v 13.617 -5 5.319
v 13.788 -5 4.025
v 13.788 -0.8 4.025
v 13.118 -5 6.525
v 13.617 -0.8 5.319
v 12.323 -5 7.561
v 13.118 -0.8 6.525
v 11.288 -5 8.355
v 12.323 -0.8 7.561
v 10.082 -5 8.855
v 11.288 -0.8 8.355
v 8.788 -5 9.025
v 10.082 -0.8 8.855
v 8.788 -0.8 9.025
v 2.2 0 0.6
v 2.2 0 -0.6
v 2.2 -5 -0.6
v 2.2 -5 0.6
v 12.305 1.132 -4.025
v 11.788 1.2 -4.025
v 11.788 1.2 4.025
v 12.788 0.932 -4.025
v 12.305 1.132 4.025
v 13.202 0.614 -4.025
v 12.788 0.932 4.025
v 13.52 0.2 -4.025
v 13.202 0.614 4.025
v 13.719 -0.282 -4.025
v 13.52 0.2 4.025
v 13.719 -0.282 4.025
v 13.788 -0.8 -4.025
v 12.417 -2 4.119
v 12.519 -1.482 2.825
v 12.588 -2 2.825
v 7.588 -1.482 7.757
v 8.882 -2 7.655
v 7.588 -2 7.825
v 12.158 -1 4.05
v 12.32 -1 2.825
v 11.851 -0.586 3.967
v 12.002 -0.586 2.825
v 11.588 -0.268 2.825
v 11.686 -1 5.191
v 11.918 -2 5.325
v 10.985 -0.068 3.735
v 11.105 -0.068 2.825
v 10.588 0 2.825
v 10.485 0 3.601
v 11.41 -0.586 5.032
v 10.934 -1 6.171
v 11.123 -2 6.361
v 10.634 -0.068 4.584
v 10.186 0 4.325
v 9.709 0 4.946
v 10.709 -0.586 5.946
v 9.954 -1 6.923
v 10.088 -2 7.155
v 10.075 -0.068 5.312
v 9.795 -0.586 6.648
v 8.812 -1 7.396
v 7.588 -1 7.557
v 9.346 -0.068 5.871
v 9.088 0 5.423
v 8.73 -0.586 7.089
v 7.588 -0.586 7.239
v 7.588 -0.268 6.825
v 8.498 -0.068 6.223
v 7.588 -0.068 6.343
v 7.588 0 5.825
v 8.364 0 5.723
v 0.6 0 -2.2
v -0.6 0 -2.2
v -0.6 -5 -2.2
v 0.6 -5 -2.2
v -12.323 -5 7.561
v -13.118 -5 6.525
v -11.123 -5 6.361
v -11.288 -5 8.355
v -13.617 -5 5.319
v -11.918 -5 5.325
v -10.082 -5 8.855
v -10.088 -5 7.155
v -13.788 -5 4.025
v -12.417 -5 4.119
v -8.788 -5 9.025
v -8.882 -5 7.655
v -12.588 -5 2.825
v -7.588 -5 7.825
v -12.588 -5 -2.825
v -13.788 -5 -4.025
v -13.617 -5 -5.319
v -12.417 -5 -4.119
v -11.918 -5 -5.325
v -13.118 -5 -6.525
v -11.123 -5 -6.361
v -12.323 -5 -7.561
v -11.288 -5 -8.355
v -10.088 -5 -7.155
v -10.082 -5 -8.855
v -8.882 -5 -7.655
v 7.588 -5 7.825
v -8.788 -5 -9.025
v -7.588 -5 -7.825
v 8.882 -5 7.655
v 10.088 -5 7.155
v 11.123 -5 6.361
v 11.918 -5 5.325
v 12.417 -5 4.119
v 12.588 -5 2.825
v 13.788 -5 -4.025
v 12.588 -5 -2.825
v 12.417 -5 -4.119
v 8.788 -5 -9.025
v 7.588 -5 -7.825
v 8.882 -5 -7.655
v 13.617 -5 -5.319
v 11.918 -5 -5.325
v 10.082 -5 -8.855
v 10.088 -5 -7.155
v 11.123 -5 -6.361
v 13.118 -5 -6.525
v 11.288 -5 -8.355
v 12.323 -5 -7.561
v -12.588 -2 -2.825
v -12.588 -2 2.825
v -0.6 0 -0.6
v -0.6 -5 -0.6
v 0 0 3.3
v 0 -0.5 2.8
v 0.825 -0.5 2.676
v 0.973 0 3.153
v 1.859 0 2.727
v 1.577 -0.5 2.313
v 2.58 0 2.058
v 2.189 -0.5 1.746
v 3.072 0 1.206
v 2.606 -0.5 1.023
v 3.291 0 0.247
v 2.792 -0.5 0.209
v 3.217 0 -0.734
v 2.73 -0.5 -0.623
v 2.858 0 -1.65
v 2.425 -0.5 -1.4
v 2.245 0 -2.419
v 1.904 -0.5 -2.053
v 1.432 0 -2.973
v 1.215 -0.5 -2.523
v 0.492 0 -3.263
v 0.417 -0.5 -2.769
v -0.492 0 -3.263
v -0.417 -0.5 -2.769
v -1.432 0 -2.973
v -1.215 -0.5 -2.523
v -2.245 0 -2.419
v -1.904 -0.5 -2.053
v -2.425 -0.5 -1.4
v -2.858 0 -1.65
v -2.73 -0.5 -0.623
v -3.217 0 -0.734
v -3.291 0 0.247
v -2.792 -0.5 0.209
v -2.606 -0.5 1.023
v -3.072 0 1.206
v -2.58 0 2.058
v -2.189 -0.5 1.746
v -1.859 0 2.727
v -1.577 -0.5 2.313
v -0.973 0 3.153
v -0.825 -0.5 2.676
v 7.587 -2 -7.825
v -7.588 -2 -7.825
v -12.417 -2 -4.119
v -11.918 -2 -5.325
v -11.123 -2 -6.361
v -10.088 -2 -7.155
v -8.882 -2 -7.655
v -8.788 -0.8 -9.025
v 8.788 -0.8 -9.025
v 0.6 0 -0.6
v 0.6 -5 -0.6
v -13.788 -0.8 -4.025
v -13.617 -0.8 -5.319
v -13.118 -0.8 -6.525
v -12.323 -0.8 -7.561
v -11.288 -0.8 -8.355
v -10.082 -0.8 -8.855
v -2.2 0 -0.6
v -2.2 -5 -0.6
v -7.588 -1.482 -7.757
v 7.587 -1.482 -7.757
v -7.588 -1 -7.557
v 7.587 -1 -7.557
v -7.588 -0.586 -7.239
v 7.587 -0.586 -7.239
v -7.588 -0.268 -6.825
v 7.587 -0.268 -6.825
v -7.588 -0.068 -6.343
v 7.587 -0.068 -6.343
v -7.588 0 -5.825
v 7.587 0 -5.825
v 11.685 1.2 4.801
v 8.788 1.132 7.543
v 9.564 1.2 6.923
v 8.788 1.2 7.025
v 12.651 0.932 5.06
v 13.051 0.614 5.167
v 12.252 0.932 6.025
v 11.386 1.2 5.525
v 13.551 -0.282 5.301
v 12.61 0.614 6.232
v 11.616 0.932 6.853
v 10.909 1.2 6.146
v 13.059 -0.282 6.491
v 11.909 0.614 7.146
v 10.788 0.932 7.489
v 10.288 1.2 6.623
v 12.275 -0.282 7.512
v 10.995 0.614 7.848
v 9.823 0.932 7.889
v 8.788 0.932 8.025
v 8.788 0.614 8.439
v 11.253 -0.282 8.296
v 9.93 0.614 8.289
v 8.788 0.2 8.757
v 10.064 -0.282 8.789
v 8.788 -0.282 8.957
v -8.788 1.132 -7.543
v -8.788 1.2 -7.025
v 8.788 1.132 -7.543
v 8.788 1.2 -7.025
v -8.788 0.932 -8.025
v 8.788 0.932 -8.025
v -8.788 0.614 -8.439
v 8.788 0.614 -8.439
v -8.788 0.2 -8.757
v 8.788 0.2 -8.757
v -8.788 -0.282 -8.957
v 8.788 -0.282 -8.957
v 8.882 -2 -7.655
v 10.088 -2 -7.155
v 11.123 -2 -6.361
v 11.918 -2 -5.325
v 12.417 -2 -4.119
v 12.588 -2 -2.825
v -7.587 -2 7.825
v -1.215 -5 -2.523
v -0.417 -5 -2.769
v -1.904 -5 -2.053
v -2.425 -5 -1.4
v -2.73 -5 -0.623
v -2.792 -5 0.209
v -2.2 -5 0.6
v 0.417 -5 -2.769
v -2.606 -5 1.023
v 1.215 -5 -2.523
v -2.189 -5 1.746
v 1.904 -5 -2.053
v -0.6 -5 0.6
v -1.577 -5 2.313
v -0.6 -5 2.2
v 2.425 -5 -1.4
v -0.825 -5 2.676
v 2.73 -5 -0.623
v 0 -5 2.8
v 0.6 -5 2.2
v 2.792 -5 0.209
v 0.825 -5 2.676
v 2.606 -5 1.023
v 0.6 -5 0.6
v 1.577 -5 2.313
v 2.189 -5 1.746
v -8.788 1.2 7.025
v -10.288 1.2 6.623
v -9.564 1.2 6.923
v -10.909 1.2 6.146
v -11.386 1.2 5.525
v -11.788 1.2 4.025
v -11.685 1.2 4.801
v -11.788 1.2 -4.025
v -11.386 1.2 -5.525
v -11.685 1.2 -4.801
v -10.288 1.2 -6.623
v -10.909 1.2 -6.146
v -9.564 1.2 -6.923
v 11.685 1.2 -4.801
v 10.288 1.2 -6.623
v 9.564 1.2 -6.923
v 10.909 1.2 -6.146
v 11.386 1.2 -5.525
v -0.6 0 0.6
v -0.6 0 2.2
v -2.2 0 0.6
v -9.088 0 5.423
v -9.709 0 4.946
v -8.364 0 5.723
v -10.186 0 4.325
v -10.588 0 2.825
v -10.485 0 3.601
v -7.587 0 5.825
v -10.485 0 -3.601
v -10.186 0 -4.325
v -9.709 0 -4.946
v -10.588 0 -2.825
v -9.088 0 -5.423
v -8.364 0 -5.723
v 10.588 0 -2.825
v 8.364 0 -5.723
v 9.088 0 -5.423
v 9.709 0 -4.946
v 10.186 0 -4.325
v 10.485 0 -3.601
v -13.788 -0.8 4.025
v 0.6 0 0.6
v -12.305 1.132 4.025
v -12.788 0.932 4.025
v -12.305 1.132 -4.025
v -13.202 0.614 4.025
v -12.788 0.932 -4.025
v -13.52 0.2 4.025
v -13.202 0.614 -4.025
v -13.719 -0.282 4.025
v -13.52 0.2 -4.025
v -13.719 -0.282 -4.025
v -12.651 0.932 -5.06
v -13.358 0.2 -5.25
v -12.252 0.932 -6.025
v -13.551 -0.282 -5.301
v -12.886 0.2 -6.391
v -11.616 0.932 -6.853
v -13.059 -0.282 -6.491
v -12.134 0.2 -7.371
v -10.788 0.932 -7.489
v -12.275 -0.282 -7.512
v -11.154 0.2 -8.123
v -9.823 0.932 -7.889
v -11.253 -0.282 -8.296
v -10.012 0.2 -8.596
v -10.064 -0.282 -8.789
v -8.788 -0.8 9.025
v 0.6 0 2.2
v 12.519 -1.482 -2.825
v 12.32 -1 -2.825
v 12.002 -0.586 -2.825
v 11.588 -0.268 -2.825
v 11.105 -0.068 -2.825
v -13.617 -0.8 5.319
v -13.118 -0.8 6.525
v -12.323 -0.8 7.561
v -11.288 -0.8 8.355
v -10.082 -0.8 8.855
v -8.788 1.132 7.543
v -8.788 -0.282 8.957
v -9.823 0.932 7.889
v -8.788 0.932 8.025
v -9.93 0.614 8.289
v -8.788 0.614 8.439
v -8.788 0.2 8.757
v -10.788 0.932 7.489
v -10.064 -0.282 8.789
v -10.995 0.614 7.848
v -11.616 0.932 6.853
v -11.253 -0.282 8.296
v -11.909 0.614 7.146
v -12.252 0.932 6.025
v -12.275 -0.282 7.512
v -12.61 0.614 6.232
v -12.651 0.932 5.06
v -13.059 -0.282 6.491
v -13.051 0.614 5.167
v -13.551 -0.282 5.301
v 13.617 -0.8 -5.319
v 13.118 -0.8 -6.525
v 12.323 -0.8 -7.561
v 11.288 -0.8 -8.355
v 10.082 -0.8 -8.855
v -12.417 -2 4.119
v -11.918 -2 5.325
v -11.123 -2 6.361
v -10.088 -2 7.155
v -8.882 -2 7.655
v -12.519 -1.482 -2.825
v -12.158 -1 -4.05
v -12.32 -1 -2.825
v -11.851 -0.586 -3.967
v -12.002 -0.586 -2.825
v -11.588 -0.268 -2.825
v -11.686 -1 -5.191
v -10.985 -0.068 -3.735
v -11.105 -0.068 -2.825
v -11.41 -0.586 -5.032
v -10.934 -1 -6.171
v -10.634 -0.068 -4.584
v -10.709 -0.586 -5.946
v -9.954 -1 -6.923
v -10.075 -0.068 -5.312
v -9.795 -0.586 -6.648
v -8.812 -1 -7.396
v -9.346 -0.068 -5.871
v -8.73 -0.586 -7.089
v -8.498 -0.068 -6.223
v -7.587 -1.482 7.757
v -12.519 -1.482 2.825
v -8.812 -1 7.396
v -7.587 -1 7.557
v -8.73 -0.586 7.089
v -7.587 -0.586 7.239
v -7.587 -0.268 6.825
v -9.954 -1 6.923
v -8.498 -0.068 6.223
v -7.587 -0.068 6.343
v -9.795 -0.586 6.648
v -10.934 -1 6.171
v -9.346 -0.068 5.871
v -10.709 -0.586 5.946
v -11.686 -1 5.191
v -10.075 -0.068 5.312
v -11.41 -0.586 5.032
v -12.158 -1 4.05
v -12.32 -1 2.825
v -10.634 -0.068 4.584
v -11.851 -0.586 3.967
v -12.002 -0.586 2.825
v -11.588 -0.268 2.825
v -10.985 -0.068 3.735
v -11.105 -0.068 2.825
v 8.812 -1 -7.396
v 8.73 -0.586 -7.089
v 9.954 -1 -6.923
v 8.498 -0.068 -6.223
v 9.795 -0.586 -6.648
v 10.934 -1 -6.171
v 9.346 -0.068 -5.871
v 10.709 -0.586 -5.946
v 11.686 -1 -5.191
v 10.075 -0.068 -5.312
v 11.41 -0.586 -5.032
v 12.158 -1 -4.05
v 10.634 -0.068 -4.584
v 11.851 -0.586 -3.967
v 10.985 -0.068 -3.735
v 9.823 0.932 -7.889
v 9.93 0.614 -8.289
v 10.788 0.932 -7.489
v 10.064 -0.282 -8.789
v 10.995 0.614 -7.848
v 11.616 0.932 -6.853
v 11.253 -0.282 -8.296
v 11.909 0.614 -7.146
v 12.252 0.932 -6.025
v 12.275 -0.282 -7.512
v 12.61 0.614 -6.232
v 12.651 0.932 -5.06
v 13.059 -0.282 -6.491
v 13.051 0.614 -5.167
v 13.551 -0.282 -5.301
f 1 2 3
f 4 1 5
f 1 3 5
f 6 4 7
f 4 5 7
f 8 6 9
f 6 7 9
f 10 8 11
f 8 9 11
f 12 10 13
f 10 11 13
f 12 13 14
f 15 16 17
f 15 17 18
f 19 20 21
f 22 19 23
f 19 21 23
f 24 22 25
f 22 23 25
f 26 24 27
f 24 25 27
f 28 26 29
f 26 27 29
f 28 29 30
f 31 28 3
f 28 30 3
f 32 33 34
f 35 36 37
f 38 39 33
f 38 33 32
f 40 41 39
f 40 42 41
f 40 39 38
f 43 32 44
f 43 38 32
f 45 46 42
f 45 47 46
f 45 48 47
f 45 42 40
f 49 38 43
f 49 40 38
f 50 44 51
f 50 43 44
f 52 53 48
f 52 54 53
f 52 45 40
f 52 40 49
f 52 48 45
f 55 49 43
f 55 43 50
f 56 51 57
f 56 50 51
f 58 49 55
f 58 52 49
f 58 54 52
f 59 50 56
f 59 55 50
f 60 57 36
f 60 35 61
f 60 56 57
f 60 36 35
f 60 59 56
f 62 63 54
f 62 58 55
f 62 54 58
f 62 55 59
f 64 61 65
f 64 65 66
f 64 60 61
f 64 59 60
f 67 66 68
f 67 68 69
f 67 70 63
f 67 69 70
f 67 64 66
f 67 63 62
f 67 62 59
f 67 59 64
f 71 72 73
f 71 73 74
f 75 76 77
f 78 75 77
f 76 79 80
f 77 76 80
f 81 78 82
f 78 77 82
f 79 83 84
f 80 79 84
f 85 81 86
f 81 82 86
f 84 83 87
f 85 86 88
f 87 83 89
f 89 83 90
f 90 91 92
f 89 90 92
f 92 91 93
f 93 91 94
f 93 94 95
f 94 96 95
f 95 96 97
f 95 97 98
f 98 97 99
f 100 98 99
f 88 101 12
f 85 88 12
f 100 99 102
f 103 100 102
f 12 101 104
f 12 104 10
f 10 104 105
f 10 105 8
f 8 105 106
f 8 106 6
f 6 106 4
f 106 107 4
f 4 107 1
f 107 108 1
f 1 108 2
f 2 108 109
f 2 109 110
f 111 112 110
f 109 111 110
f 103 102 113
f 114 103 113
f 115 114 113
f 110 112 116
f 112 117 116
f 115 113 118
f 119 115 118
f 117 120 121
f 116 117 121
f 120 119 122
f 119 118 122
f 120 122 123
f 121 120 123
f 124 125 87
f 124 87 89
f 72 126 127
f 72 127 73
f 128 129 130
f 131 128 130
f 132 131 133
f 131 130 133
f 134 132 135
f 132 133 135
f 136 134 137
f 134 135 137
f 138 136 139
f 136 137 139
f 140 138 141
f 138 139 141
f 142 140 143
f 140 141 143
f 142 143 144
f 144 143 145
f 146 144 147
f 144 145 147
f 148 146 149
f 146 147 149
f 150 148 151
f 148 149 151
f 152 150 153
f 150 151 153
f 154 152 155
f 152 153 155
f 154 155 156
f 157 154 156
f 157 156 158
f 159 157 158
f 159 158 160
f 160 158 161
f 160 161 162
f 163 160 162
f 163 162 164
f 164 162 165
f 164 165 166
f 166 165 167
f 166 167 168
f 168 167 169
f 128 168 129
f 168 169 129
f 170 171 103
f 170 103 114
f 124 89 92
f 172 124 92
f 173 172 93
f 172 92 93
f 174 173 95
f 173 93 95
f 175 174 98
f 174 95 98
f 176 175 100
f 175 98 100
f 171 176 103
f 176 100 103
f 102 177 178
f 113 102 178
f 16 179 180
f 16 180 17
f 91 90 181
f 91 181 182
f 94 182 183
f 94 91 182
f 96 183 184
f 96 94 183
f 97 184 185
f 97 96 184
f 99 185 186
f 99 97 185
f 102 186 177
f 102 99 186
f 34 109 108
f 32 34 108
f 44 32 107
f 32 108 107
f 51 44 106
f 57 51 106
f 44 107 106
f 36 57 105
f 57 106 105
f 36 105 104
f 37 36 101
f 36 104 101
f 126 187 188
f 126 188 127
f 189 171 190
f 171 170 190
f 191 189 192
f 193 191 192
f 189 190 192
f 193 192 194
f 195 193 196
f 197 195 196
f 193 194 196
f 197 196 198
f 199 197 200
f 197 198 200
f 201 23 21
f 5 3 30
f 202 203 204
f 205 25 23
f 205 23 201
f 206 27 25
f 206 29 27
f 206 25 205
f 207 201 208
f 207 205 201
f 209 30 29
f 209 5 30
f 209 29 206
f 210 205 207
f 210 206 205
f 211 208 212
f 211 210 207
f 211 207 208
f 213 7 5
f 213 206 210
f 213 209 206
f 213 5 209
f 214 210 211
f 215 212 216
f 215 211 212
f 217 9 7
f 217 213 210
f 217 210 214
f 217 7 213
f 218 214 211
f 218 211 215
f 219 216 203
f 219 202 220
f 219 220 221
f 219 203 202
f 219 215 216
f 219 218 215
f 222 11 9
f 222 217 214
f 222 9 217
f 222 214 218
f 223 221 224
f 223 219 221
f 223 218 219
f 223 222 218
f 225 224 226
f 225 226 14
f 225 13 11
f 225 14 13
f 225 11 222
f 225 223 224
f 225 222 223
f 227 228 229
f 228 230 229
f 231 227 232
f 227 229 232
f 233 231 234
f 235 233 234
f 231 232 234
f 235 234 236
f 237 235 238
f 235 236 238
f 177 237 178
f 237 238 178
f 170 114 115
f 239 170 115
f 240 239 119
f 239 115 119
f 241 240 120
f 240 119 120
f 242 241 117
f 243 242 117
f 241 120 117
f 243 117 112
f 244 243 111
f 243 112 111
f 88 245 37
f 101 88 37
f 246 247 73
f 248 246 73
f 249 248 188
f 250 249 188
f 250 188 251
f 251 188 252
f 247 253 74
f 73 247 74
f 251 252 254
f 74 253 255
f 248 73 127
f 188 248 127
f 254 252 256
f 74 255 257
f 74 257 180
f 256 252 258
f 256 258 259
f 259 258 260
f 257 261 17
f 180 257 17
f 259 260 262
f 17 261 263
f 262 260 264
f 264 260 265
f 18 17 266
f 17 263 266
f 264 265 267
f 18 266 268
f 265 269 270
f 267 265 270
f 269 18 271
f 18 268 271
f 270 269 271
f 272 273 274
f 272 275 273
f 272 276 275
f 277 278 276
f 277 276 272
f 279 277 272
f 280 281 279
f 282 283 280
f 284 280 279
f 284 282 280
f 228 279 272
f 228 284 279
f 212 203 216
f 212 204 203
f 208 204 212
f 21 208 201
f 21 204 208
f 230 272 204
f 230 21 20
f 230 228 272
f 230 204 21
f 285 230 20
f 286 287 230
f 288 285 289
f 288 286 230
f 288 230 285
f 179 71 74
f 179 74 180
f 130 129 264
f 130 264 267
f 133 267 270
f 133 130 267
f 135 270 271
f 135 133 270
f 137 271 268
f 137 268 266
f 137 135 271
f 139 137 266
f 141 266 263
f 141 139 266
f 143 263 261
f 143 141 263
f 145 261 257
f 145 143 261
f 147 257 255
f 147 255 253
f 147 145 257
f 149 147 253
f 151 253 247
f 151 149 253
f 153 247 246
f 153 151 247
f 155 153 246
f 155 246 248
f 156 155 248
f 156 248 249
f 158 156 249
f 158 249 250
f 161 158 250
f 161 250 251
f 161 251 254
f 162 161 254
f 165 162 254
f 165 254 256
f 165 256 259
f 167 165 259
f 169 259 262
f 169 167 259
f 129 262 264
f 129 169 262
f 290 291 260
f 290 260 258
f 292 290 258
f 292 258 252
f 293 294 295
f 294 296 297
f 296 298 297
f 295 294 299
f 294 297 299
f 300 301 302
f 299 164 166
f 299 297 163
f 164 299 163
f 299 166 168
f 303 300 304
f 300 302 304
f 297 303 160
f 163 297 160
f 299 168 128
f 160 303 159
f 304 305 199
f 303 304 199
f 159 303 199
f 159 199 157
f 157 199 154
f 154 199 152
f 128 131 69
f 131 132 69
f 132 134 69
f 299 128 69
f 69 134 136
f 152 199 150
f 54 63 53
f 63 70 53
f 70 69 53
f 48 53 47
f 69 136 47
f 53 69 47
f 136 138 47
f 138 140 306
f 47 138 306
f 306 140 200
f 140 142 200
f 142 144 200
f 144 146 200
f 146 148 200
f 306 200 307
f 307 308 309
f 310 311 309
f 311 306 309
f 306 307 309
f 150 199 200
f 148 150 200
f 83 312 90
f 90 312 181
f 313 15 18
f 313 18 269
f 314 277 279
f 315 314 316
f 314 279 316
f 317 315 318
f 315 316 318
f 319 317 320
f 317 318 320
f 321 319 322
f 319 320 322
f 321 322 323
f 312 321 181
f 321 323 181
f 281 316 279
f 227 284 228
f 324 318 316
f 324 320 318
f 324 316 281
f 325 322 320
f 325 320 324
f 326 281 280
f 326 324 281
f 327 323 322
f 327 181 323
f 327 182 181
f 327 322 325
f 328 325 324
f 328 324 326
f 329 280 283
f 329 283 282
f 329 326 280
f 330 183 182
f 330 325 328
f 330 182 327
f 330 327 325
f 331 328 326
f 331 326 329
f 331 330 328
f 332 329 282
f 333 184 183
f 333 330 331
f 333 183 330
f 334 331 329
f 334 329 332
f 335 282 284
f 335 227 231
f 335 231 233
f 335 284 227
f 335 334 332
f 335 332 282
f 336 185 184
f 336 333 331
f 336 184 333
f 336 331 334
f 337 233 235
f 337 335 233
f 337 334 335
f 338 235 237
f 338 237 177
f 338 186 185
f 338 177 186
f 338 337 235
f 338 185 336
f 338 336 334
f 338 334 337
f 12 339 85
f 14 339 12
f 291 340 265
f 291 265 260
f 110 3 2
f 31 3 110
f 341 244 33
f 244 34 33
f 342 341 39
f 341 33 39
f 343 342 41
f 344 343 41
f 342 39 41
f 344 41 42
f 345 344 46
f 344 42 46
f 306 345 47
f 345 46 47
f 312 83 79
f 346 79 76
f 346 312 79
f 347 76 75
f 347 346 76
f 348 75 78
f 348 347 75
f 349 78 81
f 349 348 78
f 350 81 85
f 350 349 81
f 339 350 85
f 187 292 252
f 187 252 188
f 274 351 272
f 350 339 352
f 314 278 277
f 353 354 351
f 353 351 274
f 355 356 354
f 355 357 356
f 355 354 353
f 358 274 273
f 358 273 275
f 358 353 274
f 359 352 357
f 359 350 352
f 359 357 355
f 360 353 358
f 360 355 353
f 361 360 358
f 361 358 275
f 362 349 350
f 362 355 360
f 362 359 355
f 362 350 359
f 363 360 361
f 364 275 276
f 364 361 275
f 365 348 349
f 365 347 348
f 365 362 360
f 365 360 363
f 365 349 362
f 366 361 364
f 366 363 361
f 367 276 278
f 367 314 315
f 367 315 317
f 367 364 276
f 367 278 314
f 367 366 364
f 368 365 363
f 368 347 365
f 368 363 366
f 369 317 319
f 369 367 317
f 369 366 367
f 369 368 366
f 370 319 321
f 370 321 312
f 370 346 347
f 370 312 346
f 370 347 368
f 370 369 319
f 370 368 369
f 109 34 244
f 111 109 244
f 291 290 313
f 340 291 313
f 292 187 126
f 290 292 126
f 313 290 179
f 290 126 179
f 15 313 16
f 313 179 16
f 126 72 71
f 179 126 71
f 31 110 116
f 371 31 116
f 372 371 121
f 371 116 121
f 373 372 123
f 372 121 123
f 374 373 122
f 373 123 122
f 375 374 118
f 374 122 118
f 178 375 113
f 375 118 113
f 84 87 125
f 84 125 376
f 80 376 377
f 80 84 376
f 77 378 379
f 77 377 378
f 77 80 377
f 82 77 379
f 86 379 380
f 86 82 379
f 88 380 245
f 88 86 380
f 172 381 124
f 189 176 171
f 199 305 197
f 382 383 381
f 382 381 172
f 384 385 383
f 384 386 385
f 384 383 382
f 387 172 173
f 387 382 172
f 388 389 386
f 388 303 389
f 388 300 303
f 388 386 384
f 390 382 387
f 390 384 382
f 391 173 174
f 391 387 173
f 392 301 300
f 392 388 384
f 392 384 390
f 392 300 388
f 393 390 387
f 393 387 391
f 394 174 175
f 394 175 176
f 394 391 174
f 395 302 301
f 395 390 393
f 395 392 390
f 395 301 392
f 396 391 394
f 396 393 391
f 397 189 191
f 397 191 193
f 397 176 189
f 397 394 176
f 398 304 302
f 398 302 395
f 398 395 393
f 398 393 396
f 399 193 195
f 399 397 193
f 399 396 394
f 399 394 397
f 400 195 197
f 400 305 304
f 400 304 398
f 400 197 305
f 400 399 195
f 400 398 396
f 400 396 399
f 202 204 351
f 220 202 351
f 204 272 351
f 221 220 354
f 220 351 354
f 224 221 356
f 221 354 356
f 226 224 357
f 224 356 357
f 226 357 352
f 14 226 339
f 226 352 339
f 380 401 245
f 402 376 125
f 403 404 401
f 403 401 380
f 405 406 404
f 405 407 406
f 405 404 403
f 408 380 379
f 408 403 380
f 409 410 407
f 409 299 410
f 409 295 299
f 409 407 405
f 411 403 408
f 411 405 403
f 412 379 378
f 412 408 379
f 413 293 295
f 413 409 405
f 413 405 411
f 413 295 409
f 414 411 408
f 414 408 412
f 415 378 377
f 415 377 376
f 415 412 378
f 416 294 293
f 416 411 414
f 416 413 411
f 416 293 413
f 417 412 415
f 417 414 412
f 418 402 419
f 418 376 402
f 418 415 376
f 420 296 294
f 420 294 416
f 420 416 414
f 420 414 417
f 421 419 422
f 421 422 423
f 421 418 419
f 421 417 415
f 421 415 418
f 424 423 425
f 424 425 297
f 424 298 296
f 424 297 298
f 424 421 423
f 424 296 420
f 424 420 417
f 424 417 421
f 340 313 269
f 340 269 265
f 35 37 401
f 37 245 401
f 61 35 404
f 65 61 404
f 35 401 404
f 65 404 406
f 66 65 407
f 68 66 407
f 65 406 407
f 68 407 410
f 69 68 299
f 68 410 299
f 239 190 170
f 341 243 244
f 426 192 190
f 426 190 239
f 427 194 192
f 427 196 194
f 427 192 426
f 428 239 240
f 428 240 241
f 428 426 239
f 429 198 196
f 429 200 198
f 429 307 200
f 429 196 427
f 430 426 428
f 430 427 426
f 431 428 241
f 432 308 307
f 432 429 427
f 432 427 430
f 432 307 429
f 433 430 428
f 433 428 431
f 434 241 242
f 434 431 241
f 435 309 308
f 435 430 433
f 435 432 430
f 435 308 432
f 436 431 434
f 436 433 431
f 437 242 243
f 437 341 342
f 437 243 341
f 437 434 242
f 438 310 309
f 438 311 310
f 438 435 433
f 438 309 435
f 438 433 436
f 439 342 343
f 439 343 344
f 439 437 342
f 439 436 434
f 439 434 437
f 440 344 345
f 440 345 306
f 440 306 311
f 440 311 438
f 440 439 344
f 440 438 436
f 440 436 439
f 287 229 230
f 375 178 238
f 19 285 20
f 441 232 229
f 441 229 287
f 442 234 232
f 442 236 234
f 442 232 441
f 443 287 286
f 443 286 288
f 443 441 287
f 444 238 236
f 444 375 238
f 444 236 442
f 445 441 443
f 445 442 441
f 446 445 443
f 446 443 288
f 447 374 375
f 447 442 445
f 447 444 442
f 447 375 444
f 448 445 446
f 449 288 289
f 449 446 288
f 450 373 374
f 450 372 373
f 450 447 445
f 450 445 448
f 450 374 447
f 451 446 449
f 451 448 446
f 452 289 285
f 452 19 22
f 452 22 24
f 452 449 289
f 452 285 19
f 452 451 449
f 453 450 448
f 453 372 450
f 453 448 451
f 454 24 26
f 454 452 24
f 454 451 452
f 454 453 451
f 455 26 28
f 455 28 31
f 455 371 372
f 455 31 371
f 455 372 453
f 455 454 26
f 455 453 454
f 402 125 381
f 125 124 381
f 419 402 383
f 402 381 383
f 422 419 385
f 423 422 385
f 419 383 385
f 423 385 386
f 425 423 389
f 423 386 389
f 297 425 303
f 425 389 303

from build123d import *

# Parameters (mm, degrees)
SKETCH_1_R      = 2.8
EXTRUDE_1_DEPTH = 5
SKETCH_2_W      = 27.575
SKETCH_2_H      = 18.05
EXTRUDE_2_DEPTH = 1.2
SKETCH_3_W      = 27.575
SKETCH_3_H      = 18.05
SKETCH_3_W_2    = 25.175
SKETCH_3_H_2    = 15.65
EXTRUDE_3_DEPTH = 5
FILLET_1_R      = 5
FILLET_2_R      = 2
CHAMFER_1_SIZE  = 0.5


with BuildPart() as part:
    # 草图1 → 凸台-拉伸1 (new body)
    with BuildSketch(Plane(origin=(0, 0, 0), x_dir=(1, 0, 0), z_dir=(0, 1, 0))):
        with Locations(Location((0, 0, 0), (0, 0, 270))):
            Circle(SKETCH_1_R)
        Polygon((2.2, 0.6), (2.2, -0.6), (0.6, -0.6), (0.6, -2.2), (-0.6, -2.2), (-0.6, -0.6), (-2.2, -0.6), (-2.2, 0.6), (-0.6, 0.6), (-0.6, 2.2), (0.6, 2.2), (0.6, 0.6), align=None, mode=Mode.SUBTRACT)
    extrude(amount=-EXTRUDE_1_DEPTH)

    # 草图2 → 凸台-拉伸2 (add)
    with BuildSketch(Plane(origin=(0, 0, 0), x_dir=(1, 0, 0), z_dir=(0, 1, 0))):
        Rectangle(SKETCH_2_W, SKETCH_2_H)
    extrude(amount=EXTRUDE_2_DEPTH)

    # 草图3 → 凸台-拉伸3 (add)
    with BuildSketch(Plane(origin=(0, 0, 0), x_dir=(1, 0, 0), z_dir=(0, 1, 0))):
        Rectangle(SKETCH_3_W, SKETCH_3_H)
        Rectangle(SKETCH_3_W_2, SKETCH_3_H_2, mode=Mode.SUBTRACT)
    extrude(amount=-EXTRUDE_3_DEPTH)

    # 圆角1
    fillet_1_edges = [part.edges().sort_by_distance(p)[0] for p in [
        (13.7875, -1.9, 9.025),
        (13.7875, -1.9, -9.025),
        (-13.7875, -1.9, -9.025),
        (-13.7875, -1.9, 9.025),
        (-12.5875, -2.5, 7.825),
        (-12.5875, -2.5, -7.825),
        (12.5875, -2.5, -7.825),
        (12.5875, -2.5, 7.825),
    ]]
    fillet(fillet_1_edges, radius=FILLET_1_R)

    # 圆角2
    fillet_2_edges = [part.edges().sort_by_distance(p)[0] for p in [
        (-12.5875, 0, 0),
        (0, 0, 7.825),
        (0, 0, -7.825),
        (12.5875, 0, 0),
        (-11.123033906, 0, 6.360533906),
        (11.123033906, 0, 6.360533906),
        (11.123033906, 0, -6.360533906),
        (-11.123033906, 0, -6.360533906),
        (0, 1.2, -9.025),
        (13.7875, 1.2, 0),
        (-13.7875, 1.2, 0),
        (0, 1.2, 9.025),
        (-12.323033906, 1.2, -7.560533906),
        (-12.323033906, 1.2, 7.560533906),
        (12.323033906, 1.2, 7.560533906),
        (12.323033906, 1.2, -7.560533906),
    ]]
    fillet(fillet_2_edges, radius=FILLET_2_R)

    # 倒角1
    chamfer_1_edges = [part.edges().sort_by_distance(p)[0] for p in [
        (0, 0, -2.8),
    ]]
    chamfer(chamfer_1_edges, length=CHAMFER_1_SIZE)


solid = part.part
